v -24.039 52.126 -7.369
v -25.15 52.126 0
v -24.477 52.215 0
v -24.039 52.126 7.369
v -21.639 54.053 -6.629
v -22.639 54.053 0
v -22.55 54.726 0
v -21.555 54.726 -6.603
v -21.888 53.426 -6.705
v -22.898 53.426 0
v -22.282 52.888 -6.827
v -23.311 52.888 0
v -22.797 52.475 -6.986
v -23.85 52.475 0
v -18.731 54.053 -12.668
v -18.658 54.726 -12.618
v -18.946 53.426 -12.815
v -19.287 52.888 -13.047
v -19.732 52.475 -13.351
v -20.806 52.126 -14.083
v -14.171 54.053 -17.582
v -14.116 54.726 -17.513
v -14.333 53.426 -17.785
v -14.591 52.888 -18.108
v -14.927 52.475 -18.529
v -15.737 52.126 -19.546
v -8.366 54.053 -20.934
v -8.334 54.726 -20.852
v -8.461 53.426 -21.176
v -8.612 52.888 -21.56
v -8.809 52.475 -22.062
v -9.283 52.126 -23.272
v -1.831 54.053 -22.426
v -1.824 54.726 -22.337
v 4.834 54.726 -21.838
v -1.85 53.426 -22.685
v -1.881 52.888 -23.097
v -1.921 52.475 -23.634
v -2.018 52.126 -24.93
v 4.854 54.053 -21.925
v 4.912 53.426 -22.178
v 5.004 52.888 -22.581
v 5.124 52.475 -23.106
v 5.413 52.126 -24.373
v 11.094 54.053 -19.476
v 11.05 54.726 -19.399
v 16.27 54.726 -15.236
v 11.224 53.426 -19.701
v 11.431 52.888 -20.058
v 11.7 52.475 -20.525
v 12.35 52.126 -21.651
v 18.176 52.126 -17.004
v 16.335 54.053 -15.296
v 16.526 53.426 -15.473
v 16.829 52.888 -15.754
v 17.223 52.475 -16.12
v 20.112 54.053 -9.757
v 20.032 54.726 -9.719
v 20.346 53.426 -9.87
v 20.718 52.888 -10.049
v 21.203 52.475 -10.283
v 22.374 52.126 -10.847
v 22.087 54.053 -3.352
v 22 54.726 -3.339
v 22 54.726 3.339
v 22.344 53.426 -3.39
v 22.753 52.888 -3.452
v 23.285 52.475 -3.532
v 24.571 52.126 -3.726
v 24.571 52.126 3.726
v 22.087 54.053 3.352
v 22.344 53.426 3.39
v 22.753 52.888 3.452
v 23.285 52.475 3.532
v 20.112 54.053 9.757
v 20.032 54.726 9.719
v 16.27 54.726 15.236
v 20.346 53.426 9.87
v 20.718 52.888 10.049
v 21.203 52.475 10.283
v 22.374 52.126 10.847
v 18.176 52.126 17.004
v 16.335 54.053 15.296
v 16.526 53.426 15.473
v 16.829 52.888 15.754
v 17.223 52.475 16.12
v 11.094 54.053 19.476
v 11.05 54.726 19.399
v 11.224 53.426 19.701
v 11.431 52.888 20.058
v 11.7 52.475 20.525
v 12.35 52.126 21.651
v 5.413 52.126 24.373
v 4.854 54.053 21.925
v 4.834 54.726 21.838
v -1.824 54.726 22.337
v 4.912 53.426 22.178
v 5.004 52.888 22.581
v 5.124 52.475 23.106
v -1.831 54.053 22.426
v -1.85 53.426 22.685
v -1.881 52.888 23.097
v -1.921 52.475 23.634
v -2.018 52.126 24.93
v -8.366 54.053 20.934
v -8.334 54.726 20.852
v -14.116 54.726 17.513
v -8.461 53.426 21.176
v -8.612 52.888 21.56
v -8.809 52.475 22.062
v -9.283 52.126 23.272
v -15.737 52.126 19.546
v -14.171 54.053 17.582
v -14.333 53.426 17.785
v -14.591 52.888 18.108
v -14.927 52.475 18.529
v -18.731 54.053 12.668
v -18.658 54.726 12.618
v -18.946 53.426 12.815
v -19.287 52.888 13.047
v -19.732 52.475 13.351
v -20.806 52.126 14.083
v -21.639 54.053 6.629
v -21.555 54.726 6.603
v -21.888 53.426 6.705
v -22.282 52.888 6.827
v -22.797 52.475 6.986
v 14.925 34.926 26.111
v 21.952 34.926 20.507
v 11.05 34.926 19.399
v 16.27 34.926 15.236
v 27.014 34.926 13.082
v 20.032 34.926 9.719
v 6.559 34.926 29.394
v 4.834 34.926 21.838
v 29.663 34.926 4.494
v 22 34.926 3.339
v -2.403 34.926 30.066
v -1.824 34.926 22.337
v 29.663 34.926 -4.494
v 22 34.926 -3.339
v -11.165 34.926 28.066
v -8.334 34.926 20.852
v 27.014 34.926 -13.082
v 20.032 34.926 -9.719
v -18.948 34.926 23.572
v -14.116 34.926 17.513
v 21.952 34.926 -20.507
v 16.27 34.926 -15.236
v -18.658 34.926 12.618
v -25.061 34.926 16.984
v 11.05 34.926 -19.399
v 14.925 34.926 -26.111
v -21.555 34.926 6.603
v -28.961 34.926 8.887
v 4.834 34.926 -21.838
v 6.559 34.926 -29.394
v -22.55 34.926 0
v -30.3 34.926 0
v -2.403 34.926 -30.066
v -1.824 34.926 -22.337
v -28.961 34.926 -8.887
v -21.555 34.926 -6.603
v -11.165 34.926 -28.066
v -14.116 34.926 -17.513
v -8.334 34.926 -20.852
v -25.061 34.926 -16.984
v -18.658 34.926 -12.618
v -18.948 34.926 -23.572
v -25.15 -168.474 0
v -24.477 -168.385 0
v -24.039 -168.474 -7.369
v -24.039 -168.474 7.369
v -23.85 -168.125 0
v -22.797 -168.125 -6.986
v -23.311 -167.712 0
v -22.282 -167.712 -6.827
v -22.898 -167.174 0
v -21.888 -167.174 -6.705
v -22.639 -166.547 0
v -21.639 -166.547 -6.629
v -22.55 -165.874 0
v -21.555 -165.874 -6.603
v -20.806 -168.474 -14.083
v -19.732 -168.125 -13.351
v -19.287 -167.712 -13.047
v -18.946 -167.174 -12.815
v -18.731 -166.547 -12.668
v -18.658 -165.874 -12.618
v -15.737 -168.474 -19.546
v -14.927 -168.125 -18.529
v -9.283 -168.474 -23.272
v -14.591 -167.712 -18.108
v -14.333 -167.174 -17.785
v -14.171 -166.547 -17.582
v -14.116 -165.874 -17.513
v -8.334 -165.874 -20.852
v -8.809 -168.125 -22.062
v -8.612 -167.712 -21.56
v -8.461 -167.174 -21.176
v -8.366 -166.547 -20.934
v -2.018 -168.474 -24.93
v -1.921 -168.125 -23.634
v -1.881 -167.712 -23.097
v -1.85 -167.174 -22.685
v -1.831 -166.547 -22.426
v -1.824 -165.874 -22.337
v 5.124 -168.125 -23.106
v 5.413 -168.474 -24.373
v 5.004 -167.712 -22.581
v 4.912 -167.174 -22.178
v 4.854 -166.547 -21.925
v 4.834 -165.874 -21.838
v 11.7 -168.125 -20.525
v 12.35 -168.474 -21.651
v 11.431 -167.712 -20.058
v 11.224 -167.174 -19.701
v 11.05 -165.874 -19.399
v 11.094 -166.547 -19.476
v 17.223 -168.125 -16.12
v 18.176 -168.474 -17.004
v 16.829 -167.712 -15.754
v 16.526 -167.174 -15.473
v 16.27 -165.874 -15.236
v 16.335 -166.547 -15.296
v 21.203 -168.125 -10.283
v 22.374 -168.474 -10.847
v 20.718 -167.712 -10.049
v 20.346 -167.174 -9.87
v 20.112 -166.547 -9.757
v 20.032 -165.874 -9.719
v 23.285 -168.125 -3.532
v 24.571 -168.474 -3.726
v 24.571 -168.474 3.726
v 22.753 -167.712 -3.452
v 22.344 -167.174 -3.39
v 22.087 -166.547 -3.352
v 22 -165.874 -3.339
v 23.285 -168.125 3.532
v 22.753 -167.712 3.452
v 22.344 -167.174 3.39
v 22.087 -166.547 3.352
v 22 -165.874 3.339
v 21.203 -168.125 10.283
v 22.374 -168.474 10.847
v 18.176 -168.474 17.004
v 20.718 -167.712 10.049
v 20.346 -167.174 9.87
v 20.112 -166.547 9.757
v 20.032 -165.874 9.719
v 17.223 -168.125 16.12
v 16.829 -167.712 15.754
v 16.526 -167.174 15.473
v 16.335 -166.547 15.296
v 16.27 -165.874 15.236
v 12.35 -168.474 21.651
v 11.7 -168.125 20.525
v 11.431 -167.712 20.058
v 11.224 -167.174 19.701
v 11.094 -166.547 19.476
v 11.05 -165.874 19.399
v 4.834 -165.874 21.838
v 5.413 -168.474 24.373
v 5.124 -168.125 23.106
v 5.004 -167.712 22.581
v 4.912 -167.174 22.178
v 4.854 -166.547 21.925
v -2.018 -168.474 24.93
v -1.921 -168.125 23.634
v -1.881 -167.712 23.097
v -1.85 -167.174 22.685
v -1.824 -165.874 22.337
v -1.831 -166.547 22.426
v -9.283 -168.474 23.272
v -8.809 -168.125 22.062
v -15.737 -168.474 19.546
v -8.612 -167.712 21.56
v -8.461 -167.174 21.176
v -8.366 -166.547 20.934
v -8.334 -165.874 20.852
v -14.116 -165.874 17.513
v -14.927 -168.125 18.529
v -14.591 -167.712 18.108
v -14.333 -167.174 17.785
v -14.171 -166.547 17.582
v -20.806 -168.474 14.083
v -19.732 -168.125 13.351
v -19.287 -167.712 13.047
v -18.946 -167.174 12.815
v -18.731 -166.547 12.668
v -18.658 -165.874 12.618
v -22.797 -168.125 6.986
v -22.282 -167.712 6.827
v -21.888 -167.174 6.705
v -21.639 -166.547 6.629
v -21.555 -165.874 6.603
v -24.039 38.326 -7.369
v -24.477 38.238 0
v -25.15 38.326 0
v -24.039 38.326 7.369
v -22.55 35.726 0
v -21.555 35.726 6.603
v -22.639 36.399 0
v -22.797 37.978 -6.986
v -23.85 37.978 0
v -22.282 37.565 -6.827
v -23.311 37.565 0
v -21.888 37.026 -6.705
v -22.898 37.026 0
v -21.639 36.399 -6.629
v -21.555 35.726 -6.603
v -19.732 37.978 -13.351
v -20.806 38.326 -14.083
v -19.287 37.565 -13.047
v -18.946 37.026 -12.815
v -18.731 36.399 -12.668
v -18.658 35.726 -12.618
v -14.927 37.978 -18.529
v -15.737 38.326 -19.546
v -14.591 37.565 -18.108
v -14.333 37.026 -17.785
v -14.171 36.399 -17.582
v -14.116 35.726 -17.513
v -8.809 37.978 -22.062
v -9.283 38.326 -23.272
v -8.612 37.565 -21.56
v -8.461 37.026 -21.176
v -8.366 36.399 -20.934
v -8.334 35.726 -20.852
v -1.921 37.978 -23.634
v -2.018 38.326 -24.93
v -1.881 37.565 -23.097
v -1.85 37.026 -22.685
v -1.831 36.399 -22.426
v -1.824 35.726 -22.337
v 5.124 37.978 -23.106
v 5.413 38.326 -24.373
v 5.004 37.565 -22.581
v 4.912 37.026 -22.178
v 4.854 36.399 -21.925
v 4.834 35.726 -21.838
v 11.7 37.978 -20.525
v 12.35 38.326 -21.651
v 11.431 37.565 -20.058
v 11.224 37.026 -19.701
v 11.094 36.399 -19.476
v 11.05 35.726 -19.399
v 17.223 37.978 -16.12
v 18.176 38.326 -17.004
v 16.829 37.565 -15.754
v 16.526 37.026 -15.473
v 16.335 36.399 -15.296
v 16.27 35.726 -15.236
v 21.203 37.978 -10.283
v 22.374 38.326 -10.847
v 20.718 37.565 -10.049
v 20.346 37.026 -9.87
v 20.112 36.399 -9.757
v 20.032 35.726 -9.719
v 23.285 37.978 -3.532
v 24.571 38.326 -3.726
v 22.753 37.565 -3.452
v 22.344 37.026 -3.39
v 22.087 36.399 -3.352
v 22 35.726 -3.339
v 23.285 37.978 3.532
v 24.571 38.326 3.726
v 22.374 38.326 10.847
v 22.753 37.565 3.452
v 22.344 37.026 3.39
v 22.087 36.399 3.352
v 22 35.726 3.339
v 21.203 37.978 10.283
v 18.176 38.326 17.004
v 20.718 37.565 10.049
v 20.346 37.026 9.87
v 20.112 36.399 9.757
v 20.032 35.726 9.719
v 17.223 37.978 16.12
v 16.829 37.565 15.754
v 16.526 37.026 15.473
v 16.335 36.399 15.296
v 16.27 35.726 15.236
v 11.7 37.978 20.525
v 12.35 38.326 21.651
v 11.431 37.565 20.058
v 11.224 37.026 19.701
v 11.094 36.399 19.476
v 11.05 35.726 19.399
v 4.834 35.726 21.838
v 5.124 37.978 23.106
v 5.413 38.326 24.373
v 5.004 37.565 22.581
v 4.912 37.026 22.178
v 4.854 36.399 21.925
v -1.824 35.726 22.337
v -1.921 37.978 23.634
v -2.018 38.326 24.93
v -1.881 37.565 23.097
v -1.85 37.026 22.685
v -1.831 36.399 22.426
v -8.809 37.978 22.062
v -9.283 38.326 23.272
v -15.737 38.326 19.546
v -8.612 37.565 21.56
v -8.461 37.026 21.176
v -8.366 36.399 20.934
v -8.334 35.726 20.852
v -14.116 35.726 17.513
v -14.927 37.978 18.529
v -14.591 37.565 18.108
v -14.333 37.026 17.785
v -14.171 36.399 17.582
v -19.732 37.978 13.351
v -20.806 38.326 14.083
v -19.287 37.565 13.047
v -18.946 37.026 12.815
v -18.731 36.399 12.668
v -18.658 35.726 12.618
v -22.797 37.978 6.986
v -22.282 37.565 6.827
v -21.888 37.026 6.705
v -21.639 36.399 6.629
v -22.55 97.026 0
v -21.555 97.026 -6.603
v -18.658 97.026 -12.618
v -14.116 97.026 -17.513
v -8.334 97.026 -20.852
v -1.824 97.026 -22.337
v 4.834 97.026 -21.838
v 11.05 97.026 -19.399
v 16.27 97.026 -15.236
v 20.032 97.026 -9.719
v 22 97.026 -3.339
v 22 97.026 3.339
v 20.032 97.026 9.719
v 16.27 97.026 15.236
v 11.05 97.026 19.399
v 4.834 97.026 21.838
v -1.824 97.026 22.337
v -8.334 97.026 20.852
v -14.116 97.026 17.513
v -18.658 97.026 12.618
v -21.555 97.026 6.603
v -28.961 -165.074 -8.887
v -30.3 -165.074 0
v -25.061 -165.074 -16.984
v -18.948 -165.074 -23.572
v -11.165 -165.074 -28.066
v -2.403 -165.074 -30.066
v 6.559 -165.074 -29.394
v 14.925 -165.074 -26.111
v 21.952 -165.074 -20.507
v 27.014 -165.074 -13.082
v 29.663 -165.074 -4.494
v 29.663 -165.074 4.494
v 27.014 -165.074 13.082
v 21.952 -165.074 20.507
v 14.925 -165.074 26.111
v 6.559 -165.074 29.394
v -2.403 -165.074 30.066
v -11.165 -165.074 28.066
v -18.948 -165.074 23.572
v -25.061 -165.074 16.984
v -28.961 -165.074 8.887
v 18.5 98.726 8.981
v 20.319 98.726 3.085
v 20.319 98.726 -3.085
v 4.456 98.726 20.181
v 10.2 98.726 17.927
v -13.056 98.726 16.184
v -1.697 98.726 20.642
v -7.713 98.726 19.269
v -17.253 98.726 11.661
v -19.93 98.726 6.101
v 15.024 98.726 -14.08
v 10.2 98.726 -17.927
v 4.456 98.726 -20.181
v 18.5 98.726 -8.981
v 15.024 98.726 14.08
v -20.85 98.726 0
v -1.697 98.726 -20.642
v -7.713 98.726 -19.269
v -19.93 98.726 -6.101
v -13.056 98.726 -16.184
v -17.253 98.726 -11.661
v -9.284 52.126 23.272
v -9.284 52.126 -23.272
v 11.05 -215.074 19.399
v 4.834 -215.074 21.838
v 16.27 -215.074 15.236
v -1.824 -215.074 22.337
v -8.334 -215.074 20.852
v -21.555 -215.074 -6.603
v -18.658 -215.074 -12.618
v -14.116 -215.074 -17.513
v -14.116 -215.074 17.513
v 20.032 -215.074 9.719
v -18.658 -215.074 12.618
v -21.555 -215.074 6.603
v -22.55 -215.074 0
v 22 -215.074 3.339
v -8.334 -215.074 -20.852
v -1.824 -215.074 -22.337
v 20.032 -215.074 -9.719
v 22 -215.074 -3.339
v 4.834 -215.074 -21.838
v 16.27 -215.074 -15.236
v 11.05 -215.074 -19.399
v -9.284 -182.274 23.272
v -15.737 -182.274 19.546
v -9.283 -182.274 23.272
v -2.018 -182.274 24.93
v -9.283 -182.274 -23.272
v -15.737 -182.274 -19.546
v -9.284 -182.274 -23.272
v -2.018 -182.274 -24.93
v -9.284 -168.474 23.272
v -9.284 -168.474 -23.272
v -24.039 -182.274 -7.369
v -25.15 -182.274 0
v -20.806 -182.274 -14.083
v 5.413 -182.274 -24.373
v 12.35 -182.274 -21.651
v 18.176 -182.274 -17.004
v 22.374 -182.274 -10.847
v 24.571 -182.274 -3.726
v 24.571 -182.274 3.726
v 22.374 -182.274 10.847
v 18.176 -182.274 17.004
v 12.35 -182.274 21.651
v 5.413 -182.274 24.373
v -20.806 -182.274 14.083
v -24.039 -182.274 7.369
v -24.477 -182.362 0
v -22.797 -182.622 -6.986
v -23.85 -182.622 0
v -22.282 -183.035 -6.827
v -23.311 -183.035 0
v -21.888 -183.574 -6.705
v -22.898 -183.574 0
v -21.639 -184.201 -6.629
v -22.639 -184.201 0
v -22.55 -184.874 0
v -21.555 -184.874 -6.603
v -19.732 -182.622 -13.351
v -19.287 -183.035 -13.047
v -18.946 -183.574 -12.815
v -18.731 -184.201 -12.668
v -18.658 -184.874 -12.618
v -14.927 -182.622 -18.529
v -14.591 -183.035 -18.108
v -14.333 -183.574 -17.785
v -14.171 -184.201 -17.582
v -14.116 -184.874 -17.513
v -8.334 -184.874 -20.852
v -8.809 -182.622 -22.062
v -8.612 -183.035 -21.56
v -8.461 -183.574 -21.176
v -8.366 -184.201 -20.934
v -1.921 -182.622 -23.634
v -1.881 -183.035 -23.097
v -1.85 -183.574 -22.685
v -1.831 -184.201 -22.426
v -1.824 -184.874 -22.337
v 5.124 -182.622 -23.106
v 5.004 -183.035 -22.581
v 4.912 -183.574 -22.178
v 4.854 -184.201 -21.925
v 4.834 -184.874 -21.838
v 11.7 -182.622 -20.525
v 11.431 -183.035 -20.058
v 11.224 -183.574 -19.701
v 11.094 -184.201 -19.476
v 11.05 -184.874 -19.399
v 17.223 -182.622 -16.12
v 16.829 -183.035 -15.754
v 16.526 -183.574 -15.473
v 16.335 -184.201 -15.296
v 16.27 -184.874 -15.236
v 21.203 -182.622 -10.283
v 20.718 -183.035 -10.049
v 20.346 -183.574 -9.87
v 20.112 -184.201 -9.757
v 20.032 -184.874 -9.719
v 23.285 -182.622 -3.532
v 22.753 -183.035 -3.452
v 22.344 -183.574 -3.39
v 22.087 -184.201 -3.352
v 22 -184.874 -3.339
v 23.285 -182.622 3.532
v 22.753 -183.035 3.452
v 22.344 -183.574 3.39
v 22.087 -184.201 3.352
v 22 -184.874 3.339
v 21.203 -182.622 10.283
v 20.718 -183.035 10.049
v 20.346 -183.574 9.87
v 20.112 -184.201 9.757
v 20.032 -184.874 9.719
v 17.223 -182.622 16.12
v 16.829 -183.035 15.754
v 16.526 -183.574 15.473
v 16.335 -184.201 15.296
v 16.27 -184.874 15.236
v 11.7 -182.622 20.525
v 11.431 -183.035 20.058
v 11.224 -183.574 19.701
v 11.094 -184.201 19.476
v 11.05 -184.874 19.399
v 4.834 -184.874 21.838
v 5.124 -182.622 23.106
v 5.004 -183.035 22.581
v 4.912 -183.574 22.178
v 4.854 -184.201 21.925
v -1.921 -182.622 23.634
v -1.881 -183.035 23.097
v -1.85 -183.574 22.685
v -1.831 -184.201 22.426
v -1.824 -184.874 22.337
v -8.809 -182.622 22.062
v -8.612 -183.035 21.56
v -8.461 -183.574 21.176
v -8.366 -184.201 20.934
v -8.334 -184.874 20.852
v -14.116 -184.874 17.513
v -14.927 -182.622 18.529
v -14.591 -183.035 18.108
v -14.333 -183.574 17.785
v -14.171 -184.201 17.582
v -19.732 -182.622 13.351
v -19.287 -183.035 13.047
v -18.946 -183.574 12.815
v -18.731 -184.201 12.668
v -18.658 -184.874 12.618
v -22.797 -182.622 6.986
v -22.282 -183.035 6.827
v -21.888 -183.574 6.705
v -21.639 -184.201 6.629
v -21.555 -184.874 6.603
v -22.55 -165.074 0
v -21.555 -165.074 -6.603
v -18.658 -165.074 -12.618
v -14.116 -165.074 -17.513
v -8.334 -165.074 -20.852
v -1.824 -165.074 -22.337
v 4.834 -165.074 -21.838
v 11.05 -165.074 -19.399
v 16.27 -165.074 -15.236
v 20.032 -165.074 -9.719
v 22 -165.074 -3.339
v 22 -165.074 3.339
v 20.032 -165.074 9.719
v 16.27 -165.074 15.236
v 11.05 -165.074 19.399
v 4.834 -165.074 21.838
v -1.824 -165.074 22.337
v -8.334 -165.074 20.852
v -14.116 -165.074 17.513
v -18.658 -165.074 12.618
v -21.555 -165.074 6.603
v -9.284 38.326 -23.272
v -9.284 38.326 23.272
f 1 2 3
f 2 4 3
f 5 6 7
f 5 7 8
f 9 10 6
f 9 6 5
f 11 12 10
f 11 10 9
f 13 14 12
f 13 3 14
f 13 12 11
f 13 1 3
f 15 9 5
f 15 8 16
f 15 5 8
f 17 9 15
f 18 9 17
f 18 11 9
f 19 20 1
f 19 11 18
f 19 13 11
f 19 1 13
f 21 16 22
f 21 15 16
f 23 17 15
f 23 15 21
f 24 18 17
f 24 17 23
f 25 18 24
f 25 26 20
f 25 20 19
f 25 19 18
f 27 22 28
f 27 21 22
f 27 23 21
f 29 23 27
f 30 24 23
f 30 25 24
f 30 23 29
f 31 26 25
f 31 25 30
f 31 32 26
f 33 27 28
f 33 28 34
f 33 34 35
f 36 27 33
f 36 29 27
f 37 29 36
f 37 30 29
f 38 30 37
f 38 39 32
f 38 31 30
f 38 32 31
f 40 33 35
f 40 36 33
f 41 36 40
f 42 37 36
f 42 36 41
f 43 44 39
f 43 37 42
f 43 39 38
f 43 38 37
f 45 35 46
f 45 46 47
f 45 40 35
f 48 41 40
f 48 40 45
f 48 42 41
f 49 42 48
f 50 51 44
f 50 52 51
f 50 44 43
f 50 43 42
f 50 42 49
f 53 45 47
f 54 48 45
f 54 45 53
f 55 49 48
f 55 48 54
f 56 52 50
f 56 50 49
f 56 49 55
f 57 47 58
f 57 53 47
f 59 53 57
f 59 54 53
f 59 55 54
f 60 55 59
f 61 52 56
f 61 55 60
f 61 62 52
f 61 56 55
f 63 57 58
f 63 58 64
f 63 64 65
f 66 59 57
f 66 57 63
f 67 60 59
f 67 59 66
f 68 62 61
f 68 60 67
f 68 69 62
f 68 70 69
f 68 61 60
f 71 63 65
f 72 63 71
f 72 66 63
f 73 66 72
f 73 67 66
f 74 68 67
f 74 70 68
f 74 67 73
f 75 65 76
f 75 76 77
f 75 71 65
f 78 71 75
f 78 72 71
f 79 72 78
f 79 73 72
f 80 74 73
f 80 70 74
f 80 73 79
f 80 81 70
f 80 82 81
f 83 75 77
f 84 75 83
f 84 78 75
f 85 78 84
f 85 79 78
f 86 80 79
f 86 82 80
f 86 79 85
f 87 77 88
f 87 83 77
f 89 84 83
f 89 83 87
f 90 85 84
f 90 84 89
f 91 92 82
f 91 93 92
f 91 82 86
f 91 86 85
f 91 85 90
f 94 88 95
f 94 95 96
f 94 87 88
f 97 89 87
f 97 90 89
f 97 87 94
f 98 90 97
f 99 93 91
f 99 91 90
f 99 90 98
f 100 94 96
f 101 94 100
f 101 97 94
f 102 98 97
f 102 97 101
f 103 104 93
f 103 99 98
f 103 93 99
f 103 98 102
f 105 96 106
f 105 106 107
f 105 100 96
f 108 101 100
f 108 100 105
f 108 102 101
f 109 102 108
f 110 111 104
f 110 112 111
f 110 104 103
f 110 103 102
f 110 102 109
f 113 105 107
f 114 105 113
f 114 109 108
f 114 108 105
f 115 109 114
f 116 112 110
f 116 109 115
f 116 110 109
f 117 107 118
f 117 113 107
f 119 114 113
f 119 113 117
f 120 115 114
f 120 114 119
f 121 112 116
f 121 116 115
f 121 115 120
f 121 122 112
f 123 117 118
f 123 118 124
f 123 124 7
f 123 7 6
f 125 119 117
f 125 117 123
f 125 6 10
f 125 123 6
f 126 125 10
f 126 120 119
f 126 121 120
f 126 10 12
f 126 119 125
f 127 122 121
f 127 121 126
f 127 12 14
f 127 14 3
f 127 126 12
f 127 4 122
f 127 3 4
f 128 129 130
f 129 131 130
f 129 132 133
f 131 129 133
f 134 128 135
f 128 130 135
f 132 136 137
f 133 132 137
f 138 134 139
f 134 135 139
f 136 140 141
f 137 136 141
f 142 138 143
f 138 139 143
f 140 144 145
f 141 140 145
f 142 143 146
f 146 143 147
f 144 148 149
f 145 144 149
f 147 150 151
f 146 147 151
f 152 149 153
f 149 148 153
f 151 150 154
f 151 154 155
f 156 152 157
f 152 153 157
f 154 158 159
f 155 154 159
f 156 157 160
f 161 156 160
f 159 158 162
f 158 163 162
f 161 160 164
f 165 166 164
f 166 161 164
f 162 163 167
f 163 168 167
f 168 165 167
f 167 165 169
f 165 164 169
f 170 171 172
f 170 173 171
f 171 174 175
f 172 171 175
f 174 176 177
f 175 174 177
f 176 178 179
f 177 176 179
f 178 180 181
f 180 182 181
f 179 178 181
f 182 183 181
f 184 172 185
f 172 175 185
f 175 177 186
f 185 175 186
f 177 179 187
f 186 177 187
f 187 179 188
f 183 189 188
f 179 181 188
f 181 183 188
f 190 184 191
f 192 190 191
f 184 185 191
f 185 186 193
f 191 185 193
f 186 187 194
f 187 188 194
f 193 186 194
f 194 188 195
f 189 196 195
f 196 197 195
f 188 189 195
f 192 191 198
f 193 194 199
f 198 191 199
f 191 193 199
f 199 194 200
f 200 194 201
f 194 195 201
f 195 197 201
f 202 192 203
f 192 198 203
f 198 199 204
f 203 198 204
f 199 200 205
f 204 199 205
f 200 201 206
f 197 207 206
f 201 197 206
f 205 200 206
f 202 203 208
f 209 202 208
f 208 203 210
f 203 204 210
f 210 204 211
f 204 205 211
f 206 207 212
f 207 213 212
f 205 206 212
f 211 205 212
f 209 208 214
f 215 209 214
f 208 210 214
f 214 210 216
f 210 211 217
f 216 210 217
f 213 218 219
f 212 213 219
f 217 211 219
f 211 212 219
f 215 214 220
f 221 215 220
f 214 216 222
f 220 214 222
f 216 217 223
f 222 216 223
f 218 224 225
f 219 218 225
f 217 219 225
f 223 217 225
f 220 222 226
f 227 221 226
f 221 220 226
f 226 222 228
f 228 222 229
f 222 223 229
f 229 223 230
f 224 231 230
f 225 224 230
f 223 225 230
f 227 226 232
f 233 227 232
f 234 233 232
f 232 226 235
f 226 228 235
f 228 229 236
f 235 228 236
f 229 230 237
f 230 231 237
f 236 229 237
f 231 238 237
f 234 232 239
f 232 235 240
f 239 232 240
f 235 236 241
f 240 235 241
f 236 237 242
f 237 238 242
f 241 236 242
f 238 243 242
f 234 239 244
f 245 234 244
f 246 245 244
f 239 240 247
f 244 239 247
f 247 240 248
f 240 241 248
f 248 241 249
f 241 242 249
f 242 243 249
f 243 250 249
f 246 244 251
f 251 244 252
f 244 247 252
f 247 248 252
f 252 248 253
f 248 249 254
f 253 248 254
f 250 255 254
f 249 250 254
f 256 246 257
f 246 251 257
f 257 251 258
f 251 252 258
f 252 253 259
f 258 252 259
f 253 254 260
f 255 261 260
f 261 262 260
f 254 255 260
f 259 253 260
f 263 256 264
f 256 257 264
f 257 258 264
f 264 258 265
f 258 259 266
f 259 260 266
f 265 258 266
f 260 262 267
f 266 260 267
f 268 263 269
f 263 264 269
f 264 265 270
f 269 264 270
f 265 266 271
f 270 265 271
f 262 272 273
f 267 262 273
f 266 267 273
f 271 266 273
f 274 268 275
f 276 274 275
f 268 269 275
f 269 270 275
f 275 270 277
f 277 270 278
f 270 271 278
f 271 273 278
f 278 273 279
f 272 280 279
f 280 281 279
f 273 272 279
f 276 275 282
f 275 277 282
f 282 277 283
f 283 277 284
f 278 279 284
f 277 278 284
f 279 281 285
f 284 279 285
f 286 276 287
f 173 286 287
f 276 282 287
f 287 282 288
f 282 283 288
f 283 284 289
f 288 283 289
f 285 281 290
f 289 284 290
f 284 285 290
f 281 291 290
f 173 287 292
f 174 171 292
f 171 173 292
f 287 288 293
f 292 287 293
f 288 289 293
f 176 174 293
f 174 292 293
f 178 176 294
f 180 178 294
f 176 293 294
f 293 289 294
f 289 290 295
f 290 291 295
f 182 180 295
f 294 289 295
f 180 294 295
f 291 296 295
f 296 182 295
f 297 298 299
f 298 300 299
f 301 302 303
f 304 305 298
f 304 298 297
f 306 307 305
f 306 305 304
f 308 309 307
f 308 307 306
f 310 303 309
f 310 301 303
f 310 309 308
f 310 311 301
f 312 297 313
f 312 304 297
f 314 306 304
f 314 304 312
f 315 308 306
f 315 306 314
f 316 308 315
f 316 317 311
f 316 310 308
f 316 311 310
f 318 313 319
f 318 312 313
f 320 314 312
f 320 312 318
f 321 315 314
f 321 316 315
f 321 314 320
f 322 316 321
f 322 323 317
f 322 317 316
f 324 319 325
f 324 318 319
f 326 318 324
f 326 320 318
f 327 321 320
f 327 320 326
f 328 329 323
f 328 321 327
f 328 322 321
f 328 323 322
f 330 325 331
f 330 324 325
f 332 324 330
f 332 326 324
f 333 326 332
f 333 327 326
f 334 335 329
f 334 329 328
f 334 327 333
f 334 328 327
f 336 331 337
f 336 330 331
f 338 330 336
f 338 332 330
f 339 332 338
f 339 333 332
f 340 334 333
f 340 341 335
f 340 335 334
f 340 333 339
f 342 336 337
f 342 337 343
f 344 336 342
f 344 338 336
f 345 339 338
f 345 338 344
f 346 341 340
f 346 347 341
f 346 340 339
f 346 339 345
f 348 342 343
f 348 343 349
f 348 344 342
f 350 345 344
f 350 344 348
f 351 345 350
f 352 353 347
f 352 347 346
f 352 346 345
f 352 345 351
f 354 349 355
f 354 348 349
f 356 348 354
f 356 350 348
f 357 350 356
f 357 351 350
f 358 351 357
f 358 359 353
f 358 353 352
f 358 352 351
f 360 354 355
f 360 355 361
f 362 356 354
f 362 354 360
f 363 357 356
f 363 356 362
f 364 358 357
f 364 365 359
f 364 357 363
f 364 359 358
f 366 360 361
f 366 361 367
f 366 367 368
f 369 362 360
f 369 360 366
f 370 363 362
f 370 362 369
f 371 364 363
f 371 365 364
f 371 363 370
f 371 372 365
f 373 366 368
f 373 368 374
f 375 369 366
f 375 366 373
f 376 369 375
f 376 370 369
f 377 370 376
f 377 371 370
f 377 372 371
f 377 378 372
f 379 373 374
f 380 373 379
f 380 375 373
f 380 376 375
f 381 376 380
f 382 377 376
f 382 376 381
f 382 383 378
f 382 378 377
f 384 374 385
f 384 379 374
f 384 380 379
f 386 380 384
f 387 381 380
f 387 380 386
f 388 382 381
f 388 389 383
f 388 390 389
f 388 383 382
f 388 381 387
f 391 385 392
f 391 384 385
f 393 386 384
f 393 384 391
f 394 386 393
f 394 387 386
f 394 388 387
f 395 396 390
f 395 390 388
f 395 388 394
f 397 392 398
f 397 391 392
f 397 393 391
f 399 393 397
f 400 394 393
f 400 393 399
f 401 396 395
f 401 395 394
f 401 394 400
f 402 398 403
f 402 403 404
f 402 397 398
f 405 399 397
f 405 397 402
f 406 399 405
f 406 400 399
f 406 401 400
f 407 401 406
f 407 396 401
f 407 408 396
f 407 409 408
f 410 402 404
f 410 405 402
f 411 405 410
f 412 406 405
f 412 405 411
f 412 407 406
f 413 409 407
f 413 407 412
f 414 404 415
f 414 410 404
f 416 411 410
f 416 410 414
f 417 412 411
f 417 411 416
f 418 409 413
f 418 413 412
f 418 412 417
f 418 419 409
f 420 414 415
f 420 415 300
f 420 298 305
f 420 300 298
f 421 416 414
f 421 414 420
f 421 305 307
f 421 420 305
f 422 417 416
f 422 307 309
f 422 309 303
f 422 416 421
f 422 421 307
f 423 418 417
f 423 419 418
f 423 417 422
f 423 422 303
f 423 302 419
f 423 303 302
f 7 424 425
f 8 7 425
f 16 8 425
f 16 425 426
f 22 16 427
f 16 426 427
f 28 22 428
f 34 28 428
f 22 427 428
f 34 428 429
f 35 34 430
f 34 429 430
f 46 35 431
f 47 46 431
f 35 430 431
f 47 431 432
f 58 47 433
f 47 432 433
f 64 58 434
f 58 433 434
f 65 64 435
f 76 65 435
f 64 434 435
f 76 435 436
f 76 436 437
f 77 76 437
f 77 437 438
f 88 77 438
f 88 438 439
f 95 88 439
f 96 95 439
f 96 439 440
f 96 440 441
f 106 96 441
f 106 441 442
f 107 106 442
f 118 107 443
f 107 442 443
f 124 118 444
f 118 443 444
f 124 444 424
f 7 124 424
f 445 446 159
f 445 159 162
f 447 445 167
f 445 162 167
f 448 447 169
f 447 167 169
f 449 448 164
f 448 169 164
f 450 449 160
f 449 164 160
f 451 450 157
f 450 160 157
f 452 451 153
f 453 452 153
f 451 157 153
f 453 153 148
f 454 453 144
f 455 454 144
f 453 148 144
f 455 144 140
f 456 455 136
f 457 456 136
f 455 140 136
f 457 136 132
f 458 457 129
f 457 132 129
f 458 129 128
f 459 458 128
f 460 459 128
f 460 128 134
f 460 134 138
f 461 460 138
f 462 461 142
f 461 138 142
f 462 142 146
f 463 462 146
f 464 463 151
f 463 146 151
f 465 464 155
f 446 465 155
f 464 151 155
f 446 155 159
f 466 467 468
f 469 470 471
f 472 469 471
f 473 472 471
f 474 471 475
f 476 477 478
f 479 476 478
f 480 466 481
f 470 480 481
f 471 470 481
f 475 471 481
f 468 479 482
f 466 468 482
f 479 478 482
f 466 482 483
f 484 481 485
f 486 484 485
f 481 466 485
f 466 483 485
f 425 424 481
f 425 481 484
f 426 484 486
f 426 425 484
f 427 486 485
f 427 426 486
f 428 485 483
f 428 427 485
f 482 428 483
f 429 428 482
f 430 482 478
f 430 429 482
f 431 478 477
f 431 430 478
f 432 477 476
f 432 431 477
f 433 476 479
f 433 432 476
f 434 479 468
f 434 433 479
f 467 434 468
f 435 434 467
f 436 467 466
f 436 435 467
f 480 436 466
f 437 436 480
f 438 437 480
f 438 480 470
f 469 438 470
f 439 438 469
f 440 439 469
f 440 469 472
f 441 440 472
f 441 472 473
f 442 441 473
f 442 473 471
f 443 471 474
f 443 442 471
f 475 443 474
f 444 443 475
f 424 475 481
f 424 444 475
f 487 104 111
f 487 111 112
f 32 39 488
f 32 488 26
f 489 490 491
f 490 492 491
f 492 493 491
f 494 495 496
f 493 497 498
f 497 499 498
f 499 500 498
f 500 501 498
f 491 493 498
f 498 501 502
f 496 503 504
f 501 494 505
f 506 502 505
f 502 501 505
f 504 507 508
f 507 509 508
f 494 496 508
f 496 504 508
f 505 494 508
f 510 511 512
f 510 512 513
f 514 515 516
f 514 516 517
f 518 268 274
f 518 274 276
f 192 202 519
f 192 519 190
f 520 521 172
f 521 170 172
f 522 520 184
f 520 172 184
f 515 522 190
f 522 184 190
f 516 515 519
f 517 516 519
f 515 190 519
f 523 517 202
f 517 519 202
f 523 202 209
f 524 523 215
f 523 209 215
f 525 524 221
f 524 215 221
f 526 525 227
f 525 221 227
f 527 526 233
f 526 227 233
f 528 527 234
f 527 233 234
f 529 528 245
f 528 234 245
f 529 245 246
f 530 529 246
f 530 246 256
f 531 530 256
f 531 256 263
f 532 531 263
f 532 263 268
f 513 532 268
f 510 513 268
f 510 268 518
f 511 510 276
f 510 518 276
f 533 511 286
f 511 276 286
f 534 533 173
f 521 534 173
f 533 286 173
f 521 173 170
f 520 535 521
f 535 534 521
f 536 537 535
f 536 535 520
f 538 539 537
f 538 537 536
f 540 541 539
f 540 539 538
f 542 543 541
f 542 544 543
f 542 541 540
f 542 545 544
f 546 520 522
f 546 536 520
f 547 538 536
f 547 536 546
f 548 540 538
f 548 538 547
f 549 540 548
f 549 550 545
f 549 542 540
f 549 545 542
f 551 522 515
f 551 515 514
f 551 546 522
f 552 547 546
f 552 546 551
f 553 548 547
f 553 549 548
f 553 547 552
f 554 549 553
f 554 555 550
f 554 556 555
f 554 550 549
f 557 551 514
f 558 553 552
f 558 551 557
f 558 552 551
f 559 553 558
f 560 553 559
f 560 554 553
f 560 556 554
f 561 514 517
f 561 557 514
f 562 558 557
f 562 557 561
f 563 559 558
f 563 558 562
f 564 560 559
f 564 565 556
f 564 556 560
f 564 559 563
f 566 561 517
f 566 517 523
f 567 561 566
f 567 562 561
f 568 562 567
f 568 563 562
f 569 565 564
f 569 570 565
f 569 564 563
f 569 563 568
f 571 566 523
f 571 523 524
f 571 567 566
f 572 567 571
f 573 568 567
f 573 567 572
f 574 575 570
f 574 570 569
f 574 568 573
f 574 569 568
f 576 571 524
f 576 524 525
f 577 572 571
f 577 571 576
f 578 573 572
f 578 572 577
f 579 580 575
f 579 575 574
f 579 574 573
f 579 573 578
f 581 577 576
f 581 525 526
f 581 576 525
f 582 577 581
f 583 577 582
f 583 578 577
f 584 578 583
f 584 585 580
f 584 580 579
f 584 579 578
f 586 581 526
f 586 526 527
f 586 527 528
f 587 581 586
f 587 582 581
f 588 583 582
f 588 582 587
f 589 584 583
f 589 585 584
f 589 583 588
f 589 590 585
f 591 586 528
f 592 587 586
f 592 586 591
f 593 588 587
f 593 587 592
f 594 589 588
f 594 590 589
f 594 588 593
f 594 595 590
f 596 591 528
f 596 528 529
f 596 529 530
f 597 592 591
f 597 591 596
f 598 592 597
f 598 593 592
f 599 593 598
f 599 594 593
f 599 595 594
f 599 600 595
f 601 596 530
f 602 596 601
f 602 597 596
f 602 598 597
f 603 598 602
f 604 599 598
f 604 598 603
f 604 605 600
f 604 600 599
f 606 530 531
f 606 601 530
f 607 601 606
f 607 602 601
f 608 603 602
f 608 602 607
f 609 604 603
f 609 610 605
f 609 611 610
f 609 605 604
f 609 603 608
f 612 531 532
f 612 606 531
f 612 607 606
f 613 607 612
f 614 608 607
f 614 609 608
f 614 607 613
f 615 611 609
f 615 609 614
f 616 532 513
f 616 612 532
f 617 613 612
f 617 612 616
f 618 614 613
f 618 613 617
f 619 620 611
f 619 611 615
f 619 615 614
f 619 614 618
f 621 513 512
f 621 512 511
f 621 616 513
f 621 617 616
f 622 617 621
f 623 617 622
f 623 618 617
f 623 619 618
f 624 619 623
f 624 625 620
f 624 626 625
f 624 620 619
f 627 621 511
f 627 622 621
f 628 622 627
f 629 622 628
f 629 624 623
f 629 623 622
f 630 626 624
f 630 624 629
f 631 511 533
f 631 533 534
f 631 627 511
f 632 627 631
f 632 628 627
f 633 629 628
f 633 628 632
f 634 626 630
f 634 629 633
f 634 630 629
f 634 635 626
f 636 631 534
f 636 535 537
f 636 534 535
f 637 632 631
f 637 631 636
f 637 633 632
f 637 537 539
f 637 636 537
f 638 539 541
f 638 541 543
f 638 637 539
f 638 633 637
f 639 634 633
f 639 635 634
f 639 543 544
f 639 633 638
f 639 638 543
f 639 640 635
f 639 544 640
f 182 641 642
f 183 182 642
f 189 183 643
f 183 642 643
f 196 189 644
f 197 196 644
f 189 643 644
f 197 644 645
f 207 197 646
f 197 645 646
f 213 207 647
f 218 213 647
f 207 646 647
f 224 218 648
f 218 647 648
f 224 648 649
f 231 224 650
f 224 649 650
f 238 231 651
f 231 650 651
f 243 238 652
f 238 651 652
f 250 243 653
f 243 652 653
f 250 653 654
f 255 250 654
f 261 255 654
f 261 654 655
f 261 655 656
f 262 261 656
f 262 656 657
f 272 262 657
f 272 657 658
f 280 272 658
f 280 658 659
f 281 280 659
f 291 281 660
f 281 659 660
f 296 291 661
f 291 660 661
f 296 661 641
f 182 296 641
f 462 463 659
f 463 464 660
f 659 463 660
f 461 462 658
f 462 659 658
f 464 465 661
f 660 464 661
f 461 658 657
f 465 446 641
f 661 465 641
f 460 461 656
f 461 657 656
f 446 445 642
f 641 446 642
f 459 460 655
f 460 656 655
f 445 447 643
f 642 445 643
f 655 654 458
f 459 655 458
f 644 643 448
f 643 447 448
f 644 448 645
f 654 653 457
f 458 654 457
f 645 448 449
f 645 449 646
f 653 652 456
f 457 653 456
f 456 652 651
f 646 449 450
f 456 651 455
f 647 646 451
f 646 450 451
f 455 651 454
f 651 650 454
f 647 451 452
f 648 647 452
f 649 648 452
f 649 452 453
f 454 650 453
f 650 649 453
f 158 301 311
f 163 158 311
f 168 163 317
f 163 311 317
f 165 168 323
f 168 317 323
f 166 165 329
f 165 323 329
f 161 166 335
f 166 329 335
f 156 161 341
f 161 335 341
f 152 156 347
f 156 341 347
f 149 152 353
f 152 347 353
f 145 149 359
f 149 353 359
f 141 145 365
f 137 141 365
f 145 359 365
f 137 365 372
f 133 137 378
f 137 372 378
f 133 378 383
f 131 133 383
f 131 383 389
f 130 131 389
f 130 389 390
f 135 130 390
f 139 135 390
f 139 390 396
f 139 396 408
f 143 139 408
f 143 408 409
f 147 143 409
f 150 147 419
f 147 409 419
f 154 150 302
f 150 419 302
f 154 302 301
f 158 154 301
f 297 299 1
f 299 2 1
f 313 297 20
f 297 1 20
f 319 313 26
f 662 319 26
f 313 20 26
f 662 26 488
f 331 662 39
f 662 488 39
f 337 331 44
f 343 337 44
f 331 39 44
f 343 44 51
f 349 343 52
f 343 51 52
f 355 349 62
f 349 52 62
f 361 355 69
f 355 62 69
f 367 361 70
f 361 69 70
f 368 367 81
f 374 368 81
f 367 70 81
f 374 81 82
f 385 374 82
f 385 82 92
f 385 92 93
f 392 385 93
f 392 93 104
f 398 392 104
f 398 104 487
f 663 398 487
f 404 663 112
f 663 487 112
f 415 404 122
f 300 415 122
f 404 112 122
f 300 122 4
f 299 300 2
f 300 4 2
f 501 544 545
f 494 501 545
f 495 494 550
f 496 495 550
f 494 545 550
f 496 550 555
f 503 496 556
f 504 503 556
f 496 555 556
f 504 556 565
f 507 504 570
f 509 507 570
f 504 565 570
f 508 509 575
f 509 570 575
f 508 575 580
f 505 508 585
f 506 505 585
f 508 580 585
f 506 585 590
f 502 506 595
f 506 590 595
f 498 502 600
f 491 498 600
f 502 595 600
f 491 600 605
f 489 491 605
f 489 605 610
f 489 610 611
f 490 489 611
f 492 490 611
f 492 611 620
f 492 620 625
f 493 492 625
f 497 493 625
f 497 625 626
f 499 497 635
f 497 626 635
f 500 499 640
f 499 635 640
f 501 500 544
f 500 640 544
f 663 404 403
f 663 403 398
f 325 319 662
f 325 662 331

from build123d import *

# Parameters (mm, degrees)
CHAMFER1_SIZE = 1.7
FILLET4_R     = 2.6
FILLET7_R     = 2.6
FILLET8_R     = 2.6
FILLET9_R     = 2.6


with BuildPart() as part:
    # Sketch1 → Revolve3 (revolve)
    with BuildSketch(Plane.XY):
        Polygon((-22.55, 98.726264023), (-0.15, 98.726264023), (-0.15, -215.073735977), (-22.55, -215.073735977), (-22.55, -182.273735977), (-25.15, -182.273735977), (-25.15, -168.473735977), (-22.55, -168.473735977), (-22.55, -165.073735977), (-30.3, -165.073735977), (-30.3, 34.926264023), (-22.55, 34.926264023), (-22.55, 38.326264023), (-25.15, 38.326264023), (-25.15, 52.126264023), (-22.55, 52.126264023), align=None)
    revolve(axis=Axis((-0.15, 98.726264023, 0), (0, -1, 0)))

    # Chamfer1
    chamfer1_edges = [part.edges().sort_by_distance(p)[0] for p in [
        (22.25, 98.726264023, 0),
    ]]
    chamfer(chamfer1_edges, length=CHAMFER1_SIZE)

    # Fillet4
    fillet4_edges = [part.edges().sort_by_distance(p)[0] for p in [
        (22.25, 52.126264023, 0),
    ]]
    fillet(fillet4_edges, radius=FILLET4_R - 0.0001)  # a hair under: the kernel refuses the full size

    # Fillet7
    fillet7_edges = [part.edges().sort_by_distance(p)[0] for p in [
        (22.25, 38.326264023, 0),
    ]]
    fillet(fillet7_edges, radius=FILLET7_R - 0.0001)  # a hair under: the kernel refuses the full size

    # Fillet8
    fillet8_edges = [part.edges().sort_by_distance(p)[0] for p in [
        (22.25, -182.273735977, 0),
    ]]
    fillet(fillet8_edges, radius=FILLET8_R - 0.0001)  # a hair under: the kernel refuses the full size

    # Fillet9
    fillet9_edges = [part.edges().sort_by_distance(p)[0] for p in [
        (22.25, -168.473735977, 0),
    ]]
    fillet(fillet9_edges, radius=FILLET9_R - 0.0001)  # a hair under: the kernel refuses the full size


solid = part.part
